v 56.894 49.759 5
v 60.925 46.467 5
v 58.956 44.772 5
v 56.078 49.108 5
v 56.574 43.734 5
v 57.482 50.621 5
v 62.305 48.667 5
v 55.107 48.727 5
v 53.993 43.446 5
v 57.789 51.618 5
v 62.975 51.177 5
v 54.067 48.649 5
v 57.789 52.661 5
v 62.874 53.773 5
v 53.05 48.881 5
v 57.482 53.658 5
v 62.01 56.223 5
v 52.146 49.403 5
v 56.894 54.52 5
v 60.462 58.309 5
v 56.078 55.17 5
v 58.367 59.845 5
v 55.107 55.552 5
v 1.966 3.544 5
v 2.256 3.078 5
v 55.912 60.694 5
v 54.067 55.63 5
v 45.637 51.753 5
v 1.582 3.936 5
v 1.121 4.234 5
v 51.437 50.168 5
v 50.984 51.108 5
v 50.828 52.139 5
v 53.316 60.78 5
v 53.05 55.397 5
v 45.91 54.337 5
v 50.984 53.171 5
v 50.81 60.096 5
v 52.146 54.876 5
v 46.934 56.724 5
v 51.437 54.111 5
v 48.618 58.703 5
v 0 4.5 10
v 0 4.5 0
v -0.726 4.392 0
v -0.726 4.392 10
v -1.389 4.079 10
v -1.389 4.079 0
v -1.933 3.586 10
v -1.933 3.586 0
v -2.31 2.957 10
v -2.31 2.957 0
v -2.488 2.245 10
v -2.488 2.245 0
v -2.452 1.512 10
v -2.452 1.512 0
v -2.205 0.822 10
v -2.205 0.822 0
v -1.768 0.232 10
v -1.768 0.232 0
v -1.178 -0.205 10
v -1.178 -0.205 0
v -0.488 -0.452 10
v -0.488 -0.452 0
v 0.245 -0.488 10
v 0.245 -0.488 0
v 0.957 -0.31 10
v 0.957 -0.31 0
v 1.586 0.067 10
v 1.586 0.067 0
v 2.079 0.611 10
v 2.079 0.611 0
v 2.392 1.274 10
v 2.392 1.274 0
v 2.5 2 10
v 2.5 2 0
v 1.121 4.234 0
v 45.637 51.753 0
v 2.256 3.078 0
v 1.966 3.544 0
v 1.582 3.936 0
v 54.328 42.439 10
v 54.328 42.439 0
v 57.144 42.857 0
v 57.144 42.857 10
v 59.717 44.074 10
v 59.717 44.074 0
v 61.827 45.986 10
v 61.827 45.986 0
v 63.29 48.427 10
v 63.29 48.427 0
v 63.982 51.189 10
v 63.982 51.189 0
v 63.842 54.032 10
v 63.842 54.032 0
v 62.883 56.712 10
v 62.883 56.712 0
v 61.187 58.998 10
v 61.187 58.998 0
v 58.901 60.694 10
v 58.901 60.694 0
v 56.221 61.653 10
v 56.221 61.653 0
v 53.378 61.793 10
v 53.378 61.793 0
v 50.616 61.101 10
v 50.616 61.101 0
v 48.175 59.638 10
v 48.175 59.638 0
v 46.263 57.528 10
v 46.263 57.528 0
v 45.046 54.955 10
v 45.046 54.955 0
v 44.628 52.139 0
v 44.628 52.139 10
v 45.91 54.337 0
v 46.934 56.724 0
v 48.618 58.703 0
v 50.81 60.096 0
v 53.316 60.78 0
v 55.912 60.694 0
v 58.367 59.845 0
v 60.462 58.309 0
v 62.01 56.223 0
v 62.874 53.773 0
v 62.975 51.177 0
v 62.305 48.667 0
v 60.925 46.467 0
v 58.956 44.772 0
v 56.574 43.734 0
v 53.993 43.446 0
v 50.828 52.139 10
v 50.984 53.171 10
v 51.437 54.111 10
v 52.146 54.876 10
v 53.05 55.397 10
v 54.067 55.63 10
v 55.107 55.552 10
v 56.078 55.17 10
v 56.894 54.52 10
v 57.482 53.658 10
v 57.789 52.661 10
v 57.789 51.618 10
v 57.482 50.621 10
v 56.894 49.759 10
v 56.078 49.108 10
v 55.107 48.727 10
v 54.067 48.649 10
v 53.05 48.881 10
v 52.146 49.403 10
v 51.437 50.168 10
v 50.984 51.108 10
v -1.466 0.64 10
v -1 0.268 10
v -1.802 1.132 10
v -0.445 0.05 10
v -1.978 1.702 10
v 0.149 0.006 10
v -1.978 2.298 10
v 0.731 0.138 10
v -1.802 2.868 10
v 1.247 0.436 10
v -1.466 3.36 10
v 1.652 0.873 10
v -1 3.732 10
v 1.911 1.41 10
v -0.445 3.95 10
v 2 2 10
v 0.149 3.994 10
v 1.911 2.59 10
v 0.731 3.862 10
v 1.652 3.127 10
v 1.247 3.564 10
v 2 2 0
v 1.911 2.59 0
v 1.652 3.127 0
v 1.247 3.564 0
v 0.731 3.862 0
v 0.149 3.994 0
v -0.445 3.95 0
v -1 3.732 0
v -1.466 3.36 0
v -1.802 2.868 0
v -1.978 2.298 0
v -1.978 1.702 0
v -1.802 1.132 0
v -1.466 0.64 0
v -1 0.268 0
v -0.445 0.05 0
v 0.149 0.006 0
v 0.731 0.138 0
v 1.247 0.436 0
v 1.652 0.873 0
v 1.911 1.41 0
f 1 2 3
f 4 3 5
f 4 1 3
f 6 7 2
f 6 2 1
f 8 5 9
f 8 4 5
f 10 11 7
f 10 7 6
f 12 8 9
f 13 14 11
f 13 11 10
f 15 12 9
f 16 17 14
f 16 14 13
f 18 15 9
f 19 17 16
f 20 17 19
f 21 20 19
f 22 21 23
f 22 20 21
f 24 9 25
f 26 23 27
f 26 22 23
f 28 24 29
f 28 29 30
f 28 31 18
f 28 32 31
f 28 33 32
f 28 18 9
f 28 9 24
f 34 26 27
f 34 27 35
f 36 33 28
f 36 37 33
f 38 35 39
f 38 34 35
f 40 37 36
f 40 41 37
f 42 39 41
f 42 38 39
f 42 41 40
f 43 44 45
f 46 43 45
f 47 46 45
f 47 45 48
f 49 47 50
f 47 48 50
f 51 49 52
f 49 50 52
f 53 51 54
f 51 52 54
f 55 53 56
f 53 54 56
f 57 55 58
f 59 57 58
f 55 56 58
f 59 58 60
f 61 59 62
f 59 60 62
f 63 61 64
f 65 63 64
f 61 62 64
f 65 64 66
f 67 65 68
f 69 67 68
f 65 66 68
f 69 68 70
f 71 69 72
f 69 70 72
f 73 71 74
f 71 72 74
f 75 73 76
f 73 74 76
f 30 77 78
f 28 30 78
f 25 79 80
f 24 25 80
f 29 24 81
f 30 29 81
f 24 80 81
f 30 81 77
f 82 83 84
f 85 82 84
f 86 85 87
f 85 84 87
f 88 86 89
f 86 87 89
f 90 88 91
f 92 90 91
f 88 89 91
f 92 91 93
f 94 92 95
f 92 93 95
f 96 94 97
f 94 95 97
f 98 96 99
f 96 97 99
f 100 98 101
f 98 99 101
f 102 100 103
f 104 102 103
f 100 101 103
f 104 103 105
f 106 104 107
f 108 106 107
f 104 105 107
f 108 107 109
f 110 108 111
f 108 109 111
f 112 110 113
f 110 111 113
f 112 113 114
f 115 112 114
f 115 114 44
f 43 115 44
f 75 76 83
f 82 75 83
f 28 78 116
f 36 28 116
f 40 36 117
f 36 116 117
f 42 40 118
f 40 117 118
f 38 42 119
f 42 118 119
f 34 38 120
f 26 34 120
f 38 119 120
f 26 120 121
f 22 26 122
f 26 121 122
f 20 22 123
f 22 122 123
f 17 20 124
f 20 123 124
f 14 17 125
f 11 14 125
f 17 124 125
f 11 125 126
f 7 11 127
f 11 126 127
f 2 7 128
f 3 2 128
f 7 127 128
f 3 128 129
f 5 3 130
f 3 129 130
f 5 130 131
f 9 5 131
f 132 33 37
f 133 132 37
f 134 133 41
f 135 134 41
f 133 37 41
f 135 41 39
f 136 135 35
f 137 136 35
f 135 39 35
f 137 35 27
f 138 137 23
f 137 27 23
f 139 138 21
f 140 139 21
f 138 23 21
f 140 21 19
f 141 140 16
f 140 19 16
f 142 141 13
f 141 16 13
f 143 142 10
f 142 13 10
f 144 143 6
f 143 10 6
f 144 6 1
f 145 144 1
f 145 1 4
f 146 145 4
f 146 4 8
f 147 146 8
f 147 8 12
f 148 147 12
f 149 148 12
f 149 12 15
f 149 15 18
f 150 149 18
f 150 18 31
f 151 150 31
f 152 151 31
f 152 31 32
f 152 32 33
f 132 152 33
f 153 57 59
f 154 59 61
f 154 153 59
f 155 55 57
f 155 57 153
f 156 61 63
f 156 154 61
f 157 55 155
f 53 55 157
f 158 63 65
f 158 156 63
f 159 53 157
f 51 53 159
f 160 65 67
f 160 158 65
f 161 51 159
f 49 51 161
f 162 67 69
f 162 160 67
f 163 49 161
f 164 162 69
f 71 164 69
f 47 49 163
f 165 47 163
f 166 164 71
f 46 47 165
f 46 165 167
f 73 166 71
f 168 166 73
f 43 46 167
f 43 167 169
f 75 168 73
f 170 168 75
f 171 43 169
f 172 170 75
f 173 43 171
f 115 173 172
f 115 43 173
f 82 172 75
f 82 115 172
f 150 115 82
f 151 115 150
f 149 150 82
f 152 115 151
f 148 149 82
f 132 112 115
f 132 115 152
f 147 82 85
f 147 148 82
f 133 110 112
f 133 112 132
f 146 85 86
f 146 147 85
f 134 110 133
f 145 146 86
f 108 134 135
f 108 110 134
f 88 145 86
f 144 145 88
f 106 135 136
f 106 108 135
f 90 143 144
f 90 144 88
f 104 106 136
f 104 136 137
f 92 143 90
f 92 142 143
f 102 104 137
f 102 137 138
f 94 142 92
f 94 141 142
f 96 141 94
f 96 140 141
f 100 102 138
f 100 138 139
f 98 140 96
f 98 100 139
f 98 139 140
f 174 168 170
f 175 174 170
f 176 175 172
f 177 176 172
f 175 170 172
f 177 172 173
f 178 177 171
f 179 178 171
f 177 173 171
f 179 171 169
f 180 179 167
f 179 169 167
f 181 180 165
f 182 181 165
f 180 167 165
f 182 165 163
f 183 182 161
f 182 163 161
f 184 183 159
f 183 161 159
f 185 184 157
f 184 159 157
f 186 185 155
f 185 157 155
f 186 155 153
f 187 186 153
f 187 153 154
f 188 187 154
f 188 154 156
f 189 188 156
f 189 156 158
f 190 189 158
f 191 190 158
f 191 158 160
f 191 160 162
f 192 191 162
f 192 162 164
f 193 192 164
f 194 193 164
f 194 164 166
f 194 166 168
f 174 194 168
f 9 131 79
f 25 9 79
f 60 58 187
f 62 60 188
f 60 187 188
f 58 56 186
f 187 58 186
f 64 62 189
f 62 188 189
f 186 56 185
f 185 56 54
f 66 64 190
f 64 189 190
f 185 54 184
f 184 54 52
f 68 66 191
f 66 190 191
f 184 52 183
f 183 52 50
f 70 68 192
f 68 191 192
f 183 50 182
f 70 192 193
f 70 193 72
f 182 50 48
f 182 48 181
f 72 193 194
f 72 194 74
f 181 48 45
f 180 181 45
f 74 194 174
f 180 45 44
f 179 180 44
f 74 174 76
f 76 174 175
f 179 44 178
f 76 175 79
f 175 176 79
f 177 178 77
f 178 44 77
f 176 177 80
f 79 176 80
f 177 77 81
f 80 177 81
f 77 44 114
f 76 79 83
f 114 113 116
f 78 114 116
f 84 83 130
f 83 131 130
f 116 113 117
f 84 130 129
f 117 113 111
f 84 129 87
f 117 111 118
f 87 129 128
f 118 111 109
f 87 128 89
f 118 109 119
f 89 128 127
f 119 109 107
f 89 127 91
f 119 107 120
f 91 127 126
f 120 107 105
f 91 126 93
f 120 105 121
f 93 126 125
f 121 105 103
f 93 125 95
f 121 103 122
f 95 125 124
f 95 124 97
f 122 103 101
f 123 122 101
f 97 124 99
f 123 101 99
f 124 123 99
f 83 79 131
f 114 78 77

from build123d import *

# Parameters (mm, degrees)
SALIENTE_EXTRUIR2_DEPTH = 10
CROQUIS2_R              = 2
CORTAR_EXTRUIR1_DEPTH   = 90.57535888
SALIENTE_EXTRUIR3_START = -5
SALIENTE_EXTRUIR3_DEPTH = 5
CROQUIS4_R              = 3.5
CORTAR_EXTRUIR2_DEPTH   = 10


with BuildPart() as part:
    # Croquis1 → Saliente-Extruir2 (new body)
    with BuildSketch(Plane.XY):
        with BuildLine():
            Line((44.628418222, 52.139361077), (0, 4.5))
            ThreePointArc((0, 4.5), (-1.767766953, 0.232233047), (2.5, 2))
            Line((2.5, 2), (54.328418222, 42.439361077))
            ThreePointArc((54.328418222, 42.439361077), (61.187353999, 58.998296855), (44.628418222, 52.139361077))
        make_face()
        with BuildLine():
            Line((53.992751033, 43.445838918), (2.255737897, 3.077797078))
            ThreePointArc((2.255737897, 3.077797078), (1.78485494, 3.750512166), (1.121414308, 4.234374622))
            Line((1.121414308, 4.234374622), (45.636989072, 51.753279039))
            ThreePointArc((45.636989072, 51.753279039), (60.462381656, 58.309003902), (53.992751033, 43.445838918))
        make_face(mode=Mode.SUBTRACT)
    extrude(amount=SALIENTE_EXTRUIR2_DEPTH)

    # Croquis2 → Cortar-Extruir1 (cut, through all)
    with BuildSketch(Plane.XY.offset(10)):
        with Locations((0, 2)):
            Circle(CROQUIS2_R)
    extrude(amount=-CORTAR_EXTRUIR1_DEPTH, mode=Mode.SUBTRACT)

    # Croquis3 → Saliente-Extruir3 (add)
    with BuildSketch(Plane.XY.offset(10).offset(SALIENTE_EXTRUIR3_START)):
        with BuildLine():
            Line((53.992751033, 43.445838918), (2.255737897, 3.077797078))
            ThreePointArc((2.255737897, 3.077797078), (1.78485494, 3.750512166), (1.121414308, 4.234374622))
            Line((1.121414308, 4.234374622), (45.636989072, 51.753279039))
            ThreePointArc((45.636989072, 51.753279039), (60.462381656, 58.309003902), (53.992751033, 43.445838918))
        make_face()
    extrude(amount=SALIENTE_EXTRUIR3_DEPTH)

    # Croquis4 → Cortar-Extruir2 (cut)
    with BuildSketch(Plane(origin=(0, 0, 5), x_dir=(-1, 0, 0), z_dir=(0, 0, -1))):
        with Locations((-54.328418222, 52.139361077)):
            Circle(CROQUIS4_R)
    extrude(amount=-CORTAR_EXTRUIR2_DEPTH, mode=Mode.SUBTRACT)


solid = part.part
